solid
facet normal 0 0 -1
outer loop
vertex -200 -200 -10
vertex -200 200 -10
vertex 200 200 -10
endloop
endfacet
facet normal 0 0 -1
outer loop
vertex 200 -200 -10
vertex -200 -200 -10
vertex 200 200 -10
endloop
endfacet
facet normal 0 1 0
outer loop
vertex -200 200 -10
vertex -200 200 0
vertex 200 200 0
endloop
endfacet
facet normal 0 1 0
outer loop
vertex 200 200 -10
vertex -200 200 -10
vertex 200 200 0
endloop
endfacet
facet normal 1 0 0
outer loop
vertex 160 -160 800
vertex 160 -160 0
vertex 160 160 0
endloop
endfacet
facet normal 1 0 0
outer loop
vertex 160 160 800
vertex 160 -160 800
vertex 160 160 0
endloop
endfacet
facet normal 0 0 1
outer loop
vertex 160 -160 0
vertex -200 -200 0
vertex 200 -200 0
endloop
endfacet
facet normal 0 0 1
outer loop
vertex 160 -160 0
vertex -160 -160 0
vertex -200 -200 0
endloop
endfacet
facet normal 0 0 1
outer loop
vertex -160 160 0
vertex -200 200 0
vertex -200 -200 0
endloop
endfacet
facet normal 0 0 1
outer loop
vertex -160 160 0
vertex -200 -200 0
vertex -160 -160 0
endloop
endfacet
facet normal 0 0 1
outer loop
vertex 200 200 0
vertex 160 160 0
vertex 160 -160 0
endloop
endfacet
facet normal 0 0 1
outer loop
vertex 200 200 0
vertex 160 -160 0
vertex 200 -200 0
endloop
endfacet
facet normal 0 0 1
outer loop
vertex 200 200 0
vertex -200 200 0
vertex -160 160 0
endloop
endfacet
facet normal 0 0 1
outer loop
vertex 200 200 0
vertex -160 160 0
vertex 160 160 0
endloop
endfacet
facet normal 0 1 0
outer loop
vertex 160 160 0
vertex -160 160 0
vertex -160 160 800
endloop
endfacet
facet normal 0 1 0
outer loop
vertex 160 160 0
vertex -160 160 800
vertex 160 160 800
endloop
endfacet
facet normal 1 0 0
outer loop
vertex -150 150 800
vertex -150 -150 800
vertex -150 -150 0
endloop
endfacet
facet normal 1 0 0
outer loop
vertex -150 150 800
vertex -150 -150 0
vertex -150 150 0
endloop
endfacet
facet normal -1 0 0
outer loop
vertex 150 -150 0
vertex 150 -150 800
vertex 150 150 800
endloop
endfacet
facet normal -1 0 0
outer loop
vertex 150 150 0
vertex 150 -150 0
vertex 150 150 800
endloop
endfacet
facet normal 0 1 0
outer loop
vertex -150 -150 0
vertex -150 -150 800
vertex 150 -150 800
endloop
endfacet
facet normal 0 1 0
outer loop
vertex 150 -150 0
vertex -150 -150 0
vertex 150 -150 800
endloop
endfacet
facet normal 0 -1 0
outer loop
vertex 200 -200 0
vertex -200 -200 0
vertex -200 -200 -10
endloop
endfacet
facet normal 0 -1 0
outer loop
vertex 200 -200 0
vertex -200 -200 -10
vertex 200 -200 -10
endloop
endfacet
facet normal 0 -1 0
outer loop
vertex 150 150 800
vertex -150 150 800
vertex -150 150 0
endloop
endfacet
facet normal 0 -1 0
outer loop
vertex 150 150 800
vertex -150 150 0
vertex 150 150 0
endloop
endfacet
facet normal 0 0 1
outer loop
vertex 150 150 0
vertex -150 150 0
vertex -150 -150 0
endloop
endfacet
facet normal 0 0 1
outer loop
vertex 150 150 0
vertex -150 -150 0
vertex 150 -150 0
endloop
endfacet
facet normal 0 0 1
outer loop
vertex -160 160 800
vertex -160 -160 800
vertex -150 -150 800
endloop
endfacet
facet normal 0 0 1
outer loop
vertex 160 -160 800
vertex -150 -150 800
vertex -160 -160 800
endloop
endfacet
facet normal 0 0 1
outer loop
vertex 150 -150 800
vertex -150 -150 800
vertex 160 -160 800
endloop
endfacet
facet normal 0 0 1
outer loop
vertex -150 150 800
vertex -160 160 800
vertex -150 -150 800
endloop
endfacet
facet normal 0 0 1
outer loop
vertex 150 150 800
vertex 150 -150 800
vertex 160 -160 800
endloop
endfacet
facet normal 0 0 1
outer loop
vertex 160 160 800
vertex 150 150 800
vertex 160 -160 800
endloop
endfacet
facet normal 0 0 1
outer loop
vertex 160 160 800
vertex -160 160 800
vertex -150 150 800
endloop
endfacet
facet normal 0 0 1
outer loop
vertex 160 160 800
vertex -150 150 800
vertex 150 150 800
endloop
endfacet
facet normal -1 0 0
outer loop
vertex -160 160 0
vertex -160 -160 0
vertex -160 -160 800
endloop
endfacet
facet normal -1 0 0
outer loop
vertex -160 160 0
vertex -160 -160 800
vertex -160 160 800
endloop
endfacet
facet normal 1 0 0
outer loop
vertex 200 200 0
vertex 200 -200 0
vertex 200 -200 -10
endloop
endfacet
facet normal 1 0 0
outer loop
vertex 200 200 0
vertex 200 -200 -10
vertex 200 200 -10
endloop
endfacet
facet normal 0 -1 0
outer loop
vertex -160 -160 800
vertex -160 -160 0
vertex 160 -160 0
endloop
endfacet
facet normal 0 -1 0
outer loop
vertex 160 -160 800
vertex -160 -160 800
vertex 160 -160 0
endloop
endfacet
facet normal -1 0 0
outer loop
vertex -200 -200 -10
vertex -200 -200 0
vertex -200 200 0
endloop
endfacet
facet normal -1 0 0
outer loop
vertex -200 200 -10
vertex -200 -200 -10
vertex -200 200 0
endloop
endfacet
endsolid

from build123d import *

# Parameters (mm, degrees)
F0_W     = 320
F0_H     = 320
F0_W_2   = 300
F0_H_2   = 300
F1_DEPTH = 800
F2_W     = 400
F2_H     = 400
F2_W_2   = 300
F2_H_2   = 300
F3_DEPTH = 10


with BuildPart() as f1:
    # F0 (on Top) → F1 (new body)
    with BuildSketch(Plane.XY):
        Rectangle(F0_W, F0_H)
        Rectangle(F0_W_2, F0_H_2, mode=Mode.SUBTRACT)
    extrude(amount=F1_DEPTH)

    # F2 (on face) + F0 (on Top) → F3 (join)
    with BuildSketch(Plane.XY):
        Rectangle(F2_W, F2_H)
        Rectangle(F2_W_2, F2_H_2, mode=Mode.SUBTRACT)
    with BuildSketch(Plane.XY):
        Rectangle(F0_W_2, F0_H_2)
    extrude(amount=-F3_DEPTH)


solid = f1.part
